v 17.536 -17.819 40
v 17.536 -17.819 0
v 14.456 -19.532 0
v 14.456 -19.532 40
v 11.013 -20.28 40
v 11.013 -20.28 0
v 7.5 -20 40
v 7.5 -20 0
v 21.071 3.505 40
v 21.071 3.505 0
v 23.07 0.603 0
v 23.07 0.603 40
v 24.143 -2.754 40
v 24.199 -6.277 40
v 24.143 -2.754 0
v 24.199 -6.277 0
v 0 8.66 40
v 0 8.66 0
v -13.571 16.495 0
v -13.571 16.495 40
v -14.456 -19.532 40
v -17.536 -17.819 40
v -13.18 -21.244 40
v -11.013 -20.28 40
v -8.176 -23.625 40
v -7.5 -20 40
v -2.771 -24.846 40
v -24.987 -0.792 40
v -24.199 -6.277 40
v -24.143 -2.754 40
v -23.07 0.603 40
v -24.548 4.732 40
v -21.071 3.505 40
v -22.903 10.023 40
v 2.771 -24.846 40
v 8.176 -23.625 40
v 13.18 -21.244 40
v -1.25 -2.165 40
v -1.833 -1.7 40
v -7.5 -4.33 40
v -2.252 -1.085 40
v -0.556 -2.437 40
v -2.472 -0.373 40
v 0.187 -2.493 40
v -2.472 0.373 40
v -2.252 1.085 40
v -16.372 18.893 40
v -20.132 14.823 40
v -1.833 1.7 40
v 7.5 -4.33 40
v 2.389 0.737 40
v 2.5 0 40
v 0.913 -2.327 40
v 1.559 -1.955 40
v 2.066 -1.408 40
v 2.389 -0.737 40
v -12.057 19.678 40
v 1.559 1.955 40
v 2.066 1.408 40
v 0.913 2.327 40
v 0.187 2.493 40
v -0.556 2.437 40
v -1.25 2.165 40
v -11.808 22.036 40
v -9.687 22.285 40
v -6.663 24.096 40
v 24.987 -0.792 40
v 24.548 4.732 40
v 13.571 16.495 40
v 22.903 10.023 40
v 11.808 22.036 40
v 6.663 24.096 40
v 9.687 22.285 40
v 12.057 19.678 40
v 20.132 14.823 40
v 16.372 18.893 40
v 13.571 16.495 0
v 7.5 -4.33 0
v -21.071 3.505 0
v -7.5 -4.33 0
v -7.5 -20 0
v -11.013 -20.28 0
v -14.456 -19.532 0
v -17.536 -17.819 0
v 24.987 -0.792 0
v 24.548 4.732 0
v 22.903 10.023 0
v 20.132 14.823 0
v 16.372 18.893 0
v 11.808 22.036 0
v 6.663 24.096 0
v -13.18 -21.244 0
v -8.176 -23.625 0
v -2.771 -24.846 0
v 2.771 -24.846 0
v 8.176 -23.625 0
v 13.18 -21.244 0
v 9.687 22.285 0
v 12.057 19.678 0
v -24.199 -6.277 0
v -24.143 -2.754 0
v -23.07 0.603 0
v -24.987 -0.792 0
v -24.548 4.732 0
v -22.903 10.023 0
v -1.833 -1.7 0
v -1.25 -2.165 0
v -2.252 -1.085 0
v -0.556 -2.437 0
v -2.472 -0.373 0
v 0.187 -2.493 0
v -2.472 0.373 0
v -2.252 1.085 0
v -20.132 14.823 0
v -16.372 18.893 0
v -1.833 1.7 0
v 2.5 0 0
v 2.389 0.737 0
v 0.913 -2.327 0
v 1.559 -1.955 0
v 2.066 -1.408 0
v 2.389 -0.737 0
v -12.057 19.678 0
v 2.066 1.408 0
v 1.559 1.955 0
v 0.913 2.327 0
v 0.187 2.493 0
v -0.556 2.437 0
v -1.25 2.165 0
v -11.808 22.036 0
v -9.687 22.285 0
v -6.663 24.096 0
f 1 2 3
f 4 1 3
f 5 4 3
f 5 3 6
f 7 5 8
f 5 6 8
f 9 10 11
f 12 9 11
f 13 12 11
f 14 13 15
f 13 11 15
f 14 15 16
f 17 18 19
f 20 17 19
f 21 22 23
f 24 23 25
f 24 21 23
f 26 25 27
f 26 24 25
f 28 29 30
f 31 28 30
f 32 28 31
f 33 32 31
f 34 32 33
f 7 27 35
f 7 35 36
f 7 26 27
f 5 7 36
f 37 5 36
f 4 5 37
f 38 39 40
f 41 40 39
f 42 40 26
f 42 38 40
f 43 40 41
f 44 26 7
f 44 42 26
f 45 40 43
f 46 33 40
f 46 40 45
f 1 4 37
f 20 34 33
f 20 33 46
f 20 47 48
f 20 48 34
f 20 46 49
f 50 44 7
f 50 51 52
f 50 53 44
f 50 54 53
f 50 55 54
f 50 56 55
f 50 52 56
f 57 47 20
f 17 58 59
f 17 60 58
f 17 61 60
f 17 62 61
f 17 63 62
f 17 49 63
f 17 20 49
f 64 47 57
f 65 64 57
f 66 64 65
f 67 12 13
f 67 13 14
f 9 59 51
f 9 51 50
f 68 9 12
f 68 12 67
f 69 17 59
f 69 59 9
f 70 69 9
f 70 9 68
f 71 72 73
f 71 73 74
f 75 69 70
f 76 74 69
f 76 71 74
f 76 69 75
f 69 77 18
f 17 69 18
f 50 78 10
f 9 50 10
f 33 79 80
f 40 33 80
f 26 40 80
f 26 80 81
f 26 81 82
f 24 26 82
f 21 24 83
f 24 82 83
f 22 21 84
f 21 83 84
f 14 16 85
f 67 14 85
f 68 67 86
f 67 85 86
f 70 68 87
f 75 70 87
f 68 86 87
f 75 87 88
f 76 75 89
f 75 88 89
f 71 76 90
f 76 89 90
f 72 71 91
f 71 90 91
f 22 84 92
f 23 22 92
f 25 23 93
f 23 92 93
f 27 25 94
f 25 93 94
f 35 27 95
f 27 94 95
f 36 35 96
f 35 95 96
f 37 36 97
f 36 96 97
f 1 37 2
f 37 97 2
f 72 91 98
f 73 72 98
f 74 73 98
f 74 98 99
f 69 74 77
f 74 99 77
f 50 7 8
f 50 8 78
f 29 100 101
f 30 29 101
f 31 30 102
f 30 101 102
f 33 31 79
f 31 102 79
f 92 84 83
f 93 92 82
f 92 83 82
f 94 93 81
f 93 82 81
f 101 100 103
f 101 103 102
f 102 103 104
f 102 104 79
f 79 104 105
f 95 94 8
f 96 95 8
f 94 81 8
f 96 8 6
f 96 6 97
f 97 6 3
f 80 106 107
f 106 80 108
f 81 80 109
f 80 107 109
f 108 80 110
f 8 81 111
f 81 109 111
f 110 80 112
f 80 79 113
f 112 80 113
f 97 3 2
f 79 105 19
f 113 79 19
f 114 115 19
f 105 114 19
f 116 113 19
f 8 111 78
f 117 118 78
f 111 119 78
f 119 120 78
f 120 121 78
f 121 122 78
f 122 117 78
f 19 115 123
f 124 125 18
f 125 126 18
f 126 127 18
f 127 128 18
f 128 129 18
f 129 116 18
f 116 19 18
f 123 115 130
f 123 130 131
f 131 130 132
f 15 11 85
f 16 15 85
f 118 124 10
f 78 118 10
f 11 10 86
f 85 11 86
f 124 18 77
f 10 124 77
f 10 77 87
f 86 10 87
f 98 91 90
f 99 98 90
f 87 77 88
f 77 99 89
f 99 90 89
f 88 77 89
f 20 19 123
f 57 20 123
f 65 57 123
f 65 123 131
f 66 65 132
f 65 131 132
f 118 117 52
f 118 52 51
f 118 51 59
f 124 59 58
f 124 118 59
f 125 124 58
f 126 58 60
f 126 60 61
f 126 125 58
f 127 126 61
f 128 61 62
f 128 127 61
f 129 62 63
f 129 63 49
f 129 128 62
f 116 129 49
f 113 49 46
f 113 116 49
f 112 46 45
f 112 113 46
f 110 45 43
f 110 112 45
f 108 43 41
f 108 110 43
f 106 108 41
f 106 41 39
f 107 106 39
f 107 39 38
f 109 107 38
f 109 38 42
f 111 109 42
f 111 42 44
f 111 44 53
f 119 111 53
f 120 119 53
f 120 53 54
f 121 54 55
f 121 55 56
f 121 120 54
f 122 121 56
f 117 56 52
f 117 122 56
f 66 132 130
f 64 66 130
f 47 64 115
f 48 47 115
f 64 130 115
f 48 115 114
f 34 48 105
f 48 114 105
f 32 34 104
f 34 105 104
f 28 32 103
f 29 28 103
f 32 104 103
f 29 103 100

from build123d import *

# Parameters (mm, degrees)
SKETCH1_R           = 2.5
BOSS_EXTRUDE1_DEPTH = 40


with BuildPart() as part:
    # Sketch1 → Boss-Extrude1 (new body)
    # profile 1 of 7: a face of its own
    with BuildSketch(Plane.XY):
        with BuildLine():
            Line((-7.5, -4.330127019), (-7.5, 0))
            ThreePointArc((-7.5, 0), (-6.495190528, 3.75), (-3.75, 6.495190528))
            Line((-3.75, 6.495190528), (0, 8.660254038))
            Line((0, 8.660254038), (-13.570508076, 16.495190528))
            ThreePointArc((-13.570508076, 16.495190528), (-10.967861495, 21.068660914), (-6.663448066, 24.095610801))
            ThreePointArc((-6.663448066, 24.095610801), (-21.650635095, 12.5), (-24.199135106, -6.277090099))
            ThreePointArc((-24.199135106, -6.277090099), (-23.729926323, -1.035883777), (-21.070508076, 3.504809472))
            Line((-21.070508076, 3.504809472), (-7.5, -4.330127019))
        make_face()
    # profile 2 of 7: a face of its own
    with BuildSketch(Plane.XY):
        with BuildLine():
            Line((13.570508076, 16.495190528), (0, 8.660254038))
            Line((0, 8.660254038), (3.75, 6.495190528))
            ThreePointArc((3.75, 6.495190528), (6.495190528, 3.75), (7.5, 0))
            Line((7.5, 0), (7.5, -4.330127019))
            Line((7.5, -4.330127019), (21.070508076, 3.504809472))
            ThreePointArc((21.070508076, 3.504809472), (23.729926323, -1.035883777), (24.199135106, -6.277090099))
            ThreePointArc((24.199135106, -6.277090099), (21.650635095, 12.5), (6.663448066, 24.095610801))
            ThreePointArc((6.663448066, 24.095610801), (10.967861495, 21.068660914), (13.570508076, 16.495190528))
        make_face()
    # profile 3 of 7: a face of its own
    with BuildSketch(Plane.XY):
        with BuildLine():
            Line((-3.75, -6.495190528), (-7.5, -4.330127019))
            Line((-7.5, -4.330127019), (-7.5, -20))
            ThreePointArc((-7.5, -20), (-12.762064828, -20.032777137), (-17.53568704, -17.818520702))
            ThreePointArc((-17.53568704, -17.818520702), (0, -25), (17.53568704, -17.818520702))
            ThreePointArc((17.53568704, -17.818520702), (12.762064828, -20.032777137), (7.5, -20))
            Line((7.5, -20), (7.5, -4.330127019))
            Line((7.5, -4.330127019), (3.75, -6.495190528))
            ThreePointArc((3.75, -6.495190528), (0, -7.5), (-3.75, -6.495190528))
        make_face()
    # profile 4 of 7: a face of its own
    with BuildSketch(Plane.XY):
        with BuildLine():
            Line((0, 8.660254038), (-3.75, 6.495190528))
            ThreePointArc((-3.75, 6.495190528), (0, 7.5), (3.75, 6.495190528))
            Line((3.75, 6.495190528), (0, 8.660254038))
        make_face()
    # profile 5 of 7: a face of its own
    with BuildSketch(Plane.XY):
        with BuildLine():
            ThreePointArc((-3.75, -6.495190528), (-6.495190528, -3.75), (-7.5, 0))
            Line((-7.5, 0), (-7.5, -4.330127019))
            Line((-7.5, -4.330127019), (-3.75, -6.495190528))
        make_face()
    # profile 6 of 7: a face of its own
    with BuildSketch(Plane.XY):
        with BuildLine():
            ThreePointArc((7.5, 0), (6.495190528, -3.75), (3.75, -6.495190528))
            Line((3.75, -6.495190528), (7.5, -4.330127019))
            Line((7.5, -4.330127019), (7.5, 0))
        make_face()
    # profile 7 of 7: a face of its own
    with BuildSketch(Plane.XY):
        with BuildLine():
            ThreePointArc((-3.75, 6.495190528), (-6.495190528, 3.75), (-7.5, 0))
            ThreePointArc((-7.5, 0), (-6.495190528, -3.75), (-3.75, -6.495190528))
            ThreePointArc((-3.75, -6.495190528), (0, -7.5), (3.75, -6.495190528))
            ThreePointArc((3.75, -6.495190528), (6.495190528, -3.75), (7.5, 0))
            ThreePointArc((7.5, 0), (6.495190528, 3.75), (3.75, 6.495190528))
            ThreePointArc((3.75, 6.495190528), (0, 7.5), (-3.75, 6.495190528))
        make_face()
        Circle(SKETCH1_R, mode=Mode.SUBTRACT)
    extrude(amount=BOSS_EXTRUDE1_DEPTH)


solid = part.part
